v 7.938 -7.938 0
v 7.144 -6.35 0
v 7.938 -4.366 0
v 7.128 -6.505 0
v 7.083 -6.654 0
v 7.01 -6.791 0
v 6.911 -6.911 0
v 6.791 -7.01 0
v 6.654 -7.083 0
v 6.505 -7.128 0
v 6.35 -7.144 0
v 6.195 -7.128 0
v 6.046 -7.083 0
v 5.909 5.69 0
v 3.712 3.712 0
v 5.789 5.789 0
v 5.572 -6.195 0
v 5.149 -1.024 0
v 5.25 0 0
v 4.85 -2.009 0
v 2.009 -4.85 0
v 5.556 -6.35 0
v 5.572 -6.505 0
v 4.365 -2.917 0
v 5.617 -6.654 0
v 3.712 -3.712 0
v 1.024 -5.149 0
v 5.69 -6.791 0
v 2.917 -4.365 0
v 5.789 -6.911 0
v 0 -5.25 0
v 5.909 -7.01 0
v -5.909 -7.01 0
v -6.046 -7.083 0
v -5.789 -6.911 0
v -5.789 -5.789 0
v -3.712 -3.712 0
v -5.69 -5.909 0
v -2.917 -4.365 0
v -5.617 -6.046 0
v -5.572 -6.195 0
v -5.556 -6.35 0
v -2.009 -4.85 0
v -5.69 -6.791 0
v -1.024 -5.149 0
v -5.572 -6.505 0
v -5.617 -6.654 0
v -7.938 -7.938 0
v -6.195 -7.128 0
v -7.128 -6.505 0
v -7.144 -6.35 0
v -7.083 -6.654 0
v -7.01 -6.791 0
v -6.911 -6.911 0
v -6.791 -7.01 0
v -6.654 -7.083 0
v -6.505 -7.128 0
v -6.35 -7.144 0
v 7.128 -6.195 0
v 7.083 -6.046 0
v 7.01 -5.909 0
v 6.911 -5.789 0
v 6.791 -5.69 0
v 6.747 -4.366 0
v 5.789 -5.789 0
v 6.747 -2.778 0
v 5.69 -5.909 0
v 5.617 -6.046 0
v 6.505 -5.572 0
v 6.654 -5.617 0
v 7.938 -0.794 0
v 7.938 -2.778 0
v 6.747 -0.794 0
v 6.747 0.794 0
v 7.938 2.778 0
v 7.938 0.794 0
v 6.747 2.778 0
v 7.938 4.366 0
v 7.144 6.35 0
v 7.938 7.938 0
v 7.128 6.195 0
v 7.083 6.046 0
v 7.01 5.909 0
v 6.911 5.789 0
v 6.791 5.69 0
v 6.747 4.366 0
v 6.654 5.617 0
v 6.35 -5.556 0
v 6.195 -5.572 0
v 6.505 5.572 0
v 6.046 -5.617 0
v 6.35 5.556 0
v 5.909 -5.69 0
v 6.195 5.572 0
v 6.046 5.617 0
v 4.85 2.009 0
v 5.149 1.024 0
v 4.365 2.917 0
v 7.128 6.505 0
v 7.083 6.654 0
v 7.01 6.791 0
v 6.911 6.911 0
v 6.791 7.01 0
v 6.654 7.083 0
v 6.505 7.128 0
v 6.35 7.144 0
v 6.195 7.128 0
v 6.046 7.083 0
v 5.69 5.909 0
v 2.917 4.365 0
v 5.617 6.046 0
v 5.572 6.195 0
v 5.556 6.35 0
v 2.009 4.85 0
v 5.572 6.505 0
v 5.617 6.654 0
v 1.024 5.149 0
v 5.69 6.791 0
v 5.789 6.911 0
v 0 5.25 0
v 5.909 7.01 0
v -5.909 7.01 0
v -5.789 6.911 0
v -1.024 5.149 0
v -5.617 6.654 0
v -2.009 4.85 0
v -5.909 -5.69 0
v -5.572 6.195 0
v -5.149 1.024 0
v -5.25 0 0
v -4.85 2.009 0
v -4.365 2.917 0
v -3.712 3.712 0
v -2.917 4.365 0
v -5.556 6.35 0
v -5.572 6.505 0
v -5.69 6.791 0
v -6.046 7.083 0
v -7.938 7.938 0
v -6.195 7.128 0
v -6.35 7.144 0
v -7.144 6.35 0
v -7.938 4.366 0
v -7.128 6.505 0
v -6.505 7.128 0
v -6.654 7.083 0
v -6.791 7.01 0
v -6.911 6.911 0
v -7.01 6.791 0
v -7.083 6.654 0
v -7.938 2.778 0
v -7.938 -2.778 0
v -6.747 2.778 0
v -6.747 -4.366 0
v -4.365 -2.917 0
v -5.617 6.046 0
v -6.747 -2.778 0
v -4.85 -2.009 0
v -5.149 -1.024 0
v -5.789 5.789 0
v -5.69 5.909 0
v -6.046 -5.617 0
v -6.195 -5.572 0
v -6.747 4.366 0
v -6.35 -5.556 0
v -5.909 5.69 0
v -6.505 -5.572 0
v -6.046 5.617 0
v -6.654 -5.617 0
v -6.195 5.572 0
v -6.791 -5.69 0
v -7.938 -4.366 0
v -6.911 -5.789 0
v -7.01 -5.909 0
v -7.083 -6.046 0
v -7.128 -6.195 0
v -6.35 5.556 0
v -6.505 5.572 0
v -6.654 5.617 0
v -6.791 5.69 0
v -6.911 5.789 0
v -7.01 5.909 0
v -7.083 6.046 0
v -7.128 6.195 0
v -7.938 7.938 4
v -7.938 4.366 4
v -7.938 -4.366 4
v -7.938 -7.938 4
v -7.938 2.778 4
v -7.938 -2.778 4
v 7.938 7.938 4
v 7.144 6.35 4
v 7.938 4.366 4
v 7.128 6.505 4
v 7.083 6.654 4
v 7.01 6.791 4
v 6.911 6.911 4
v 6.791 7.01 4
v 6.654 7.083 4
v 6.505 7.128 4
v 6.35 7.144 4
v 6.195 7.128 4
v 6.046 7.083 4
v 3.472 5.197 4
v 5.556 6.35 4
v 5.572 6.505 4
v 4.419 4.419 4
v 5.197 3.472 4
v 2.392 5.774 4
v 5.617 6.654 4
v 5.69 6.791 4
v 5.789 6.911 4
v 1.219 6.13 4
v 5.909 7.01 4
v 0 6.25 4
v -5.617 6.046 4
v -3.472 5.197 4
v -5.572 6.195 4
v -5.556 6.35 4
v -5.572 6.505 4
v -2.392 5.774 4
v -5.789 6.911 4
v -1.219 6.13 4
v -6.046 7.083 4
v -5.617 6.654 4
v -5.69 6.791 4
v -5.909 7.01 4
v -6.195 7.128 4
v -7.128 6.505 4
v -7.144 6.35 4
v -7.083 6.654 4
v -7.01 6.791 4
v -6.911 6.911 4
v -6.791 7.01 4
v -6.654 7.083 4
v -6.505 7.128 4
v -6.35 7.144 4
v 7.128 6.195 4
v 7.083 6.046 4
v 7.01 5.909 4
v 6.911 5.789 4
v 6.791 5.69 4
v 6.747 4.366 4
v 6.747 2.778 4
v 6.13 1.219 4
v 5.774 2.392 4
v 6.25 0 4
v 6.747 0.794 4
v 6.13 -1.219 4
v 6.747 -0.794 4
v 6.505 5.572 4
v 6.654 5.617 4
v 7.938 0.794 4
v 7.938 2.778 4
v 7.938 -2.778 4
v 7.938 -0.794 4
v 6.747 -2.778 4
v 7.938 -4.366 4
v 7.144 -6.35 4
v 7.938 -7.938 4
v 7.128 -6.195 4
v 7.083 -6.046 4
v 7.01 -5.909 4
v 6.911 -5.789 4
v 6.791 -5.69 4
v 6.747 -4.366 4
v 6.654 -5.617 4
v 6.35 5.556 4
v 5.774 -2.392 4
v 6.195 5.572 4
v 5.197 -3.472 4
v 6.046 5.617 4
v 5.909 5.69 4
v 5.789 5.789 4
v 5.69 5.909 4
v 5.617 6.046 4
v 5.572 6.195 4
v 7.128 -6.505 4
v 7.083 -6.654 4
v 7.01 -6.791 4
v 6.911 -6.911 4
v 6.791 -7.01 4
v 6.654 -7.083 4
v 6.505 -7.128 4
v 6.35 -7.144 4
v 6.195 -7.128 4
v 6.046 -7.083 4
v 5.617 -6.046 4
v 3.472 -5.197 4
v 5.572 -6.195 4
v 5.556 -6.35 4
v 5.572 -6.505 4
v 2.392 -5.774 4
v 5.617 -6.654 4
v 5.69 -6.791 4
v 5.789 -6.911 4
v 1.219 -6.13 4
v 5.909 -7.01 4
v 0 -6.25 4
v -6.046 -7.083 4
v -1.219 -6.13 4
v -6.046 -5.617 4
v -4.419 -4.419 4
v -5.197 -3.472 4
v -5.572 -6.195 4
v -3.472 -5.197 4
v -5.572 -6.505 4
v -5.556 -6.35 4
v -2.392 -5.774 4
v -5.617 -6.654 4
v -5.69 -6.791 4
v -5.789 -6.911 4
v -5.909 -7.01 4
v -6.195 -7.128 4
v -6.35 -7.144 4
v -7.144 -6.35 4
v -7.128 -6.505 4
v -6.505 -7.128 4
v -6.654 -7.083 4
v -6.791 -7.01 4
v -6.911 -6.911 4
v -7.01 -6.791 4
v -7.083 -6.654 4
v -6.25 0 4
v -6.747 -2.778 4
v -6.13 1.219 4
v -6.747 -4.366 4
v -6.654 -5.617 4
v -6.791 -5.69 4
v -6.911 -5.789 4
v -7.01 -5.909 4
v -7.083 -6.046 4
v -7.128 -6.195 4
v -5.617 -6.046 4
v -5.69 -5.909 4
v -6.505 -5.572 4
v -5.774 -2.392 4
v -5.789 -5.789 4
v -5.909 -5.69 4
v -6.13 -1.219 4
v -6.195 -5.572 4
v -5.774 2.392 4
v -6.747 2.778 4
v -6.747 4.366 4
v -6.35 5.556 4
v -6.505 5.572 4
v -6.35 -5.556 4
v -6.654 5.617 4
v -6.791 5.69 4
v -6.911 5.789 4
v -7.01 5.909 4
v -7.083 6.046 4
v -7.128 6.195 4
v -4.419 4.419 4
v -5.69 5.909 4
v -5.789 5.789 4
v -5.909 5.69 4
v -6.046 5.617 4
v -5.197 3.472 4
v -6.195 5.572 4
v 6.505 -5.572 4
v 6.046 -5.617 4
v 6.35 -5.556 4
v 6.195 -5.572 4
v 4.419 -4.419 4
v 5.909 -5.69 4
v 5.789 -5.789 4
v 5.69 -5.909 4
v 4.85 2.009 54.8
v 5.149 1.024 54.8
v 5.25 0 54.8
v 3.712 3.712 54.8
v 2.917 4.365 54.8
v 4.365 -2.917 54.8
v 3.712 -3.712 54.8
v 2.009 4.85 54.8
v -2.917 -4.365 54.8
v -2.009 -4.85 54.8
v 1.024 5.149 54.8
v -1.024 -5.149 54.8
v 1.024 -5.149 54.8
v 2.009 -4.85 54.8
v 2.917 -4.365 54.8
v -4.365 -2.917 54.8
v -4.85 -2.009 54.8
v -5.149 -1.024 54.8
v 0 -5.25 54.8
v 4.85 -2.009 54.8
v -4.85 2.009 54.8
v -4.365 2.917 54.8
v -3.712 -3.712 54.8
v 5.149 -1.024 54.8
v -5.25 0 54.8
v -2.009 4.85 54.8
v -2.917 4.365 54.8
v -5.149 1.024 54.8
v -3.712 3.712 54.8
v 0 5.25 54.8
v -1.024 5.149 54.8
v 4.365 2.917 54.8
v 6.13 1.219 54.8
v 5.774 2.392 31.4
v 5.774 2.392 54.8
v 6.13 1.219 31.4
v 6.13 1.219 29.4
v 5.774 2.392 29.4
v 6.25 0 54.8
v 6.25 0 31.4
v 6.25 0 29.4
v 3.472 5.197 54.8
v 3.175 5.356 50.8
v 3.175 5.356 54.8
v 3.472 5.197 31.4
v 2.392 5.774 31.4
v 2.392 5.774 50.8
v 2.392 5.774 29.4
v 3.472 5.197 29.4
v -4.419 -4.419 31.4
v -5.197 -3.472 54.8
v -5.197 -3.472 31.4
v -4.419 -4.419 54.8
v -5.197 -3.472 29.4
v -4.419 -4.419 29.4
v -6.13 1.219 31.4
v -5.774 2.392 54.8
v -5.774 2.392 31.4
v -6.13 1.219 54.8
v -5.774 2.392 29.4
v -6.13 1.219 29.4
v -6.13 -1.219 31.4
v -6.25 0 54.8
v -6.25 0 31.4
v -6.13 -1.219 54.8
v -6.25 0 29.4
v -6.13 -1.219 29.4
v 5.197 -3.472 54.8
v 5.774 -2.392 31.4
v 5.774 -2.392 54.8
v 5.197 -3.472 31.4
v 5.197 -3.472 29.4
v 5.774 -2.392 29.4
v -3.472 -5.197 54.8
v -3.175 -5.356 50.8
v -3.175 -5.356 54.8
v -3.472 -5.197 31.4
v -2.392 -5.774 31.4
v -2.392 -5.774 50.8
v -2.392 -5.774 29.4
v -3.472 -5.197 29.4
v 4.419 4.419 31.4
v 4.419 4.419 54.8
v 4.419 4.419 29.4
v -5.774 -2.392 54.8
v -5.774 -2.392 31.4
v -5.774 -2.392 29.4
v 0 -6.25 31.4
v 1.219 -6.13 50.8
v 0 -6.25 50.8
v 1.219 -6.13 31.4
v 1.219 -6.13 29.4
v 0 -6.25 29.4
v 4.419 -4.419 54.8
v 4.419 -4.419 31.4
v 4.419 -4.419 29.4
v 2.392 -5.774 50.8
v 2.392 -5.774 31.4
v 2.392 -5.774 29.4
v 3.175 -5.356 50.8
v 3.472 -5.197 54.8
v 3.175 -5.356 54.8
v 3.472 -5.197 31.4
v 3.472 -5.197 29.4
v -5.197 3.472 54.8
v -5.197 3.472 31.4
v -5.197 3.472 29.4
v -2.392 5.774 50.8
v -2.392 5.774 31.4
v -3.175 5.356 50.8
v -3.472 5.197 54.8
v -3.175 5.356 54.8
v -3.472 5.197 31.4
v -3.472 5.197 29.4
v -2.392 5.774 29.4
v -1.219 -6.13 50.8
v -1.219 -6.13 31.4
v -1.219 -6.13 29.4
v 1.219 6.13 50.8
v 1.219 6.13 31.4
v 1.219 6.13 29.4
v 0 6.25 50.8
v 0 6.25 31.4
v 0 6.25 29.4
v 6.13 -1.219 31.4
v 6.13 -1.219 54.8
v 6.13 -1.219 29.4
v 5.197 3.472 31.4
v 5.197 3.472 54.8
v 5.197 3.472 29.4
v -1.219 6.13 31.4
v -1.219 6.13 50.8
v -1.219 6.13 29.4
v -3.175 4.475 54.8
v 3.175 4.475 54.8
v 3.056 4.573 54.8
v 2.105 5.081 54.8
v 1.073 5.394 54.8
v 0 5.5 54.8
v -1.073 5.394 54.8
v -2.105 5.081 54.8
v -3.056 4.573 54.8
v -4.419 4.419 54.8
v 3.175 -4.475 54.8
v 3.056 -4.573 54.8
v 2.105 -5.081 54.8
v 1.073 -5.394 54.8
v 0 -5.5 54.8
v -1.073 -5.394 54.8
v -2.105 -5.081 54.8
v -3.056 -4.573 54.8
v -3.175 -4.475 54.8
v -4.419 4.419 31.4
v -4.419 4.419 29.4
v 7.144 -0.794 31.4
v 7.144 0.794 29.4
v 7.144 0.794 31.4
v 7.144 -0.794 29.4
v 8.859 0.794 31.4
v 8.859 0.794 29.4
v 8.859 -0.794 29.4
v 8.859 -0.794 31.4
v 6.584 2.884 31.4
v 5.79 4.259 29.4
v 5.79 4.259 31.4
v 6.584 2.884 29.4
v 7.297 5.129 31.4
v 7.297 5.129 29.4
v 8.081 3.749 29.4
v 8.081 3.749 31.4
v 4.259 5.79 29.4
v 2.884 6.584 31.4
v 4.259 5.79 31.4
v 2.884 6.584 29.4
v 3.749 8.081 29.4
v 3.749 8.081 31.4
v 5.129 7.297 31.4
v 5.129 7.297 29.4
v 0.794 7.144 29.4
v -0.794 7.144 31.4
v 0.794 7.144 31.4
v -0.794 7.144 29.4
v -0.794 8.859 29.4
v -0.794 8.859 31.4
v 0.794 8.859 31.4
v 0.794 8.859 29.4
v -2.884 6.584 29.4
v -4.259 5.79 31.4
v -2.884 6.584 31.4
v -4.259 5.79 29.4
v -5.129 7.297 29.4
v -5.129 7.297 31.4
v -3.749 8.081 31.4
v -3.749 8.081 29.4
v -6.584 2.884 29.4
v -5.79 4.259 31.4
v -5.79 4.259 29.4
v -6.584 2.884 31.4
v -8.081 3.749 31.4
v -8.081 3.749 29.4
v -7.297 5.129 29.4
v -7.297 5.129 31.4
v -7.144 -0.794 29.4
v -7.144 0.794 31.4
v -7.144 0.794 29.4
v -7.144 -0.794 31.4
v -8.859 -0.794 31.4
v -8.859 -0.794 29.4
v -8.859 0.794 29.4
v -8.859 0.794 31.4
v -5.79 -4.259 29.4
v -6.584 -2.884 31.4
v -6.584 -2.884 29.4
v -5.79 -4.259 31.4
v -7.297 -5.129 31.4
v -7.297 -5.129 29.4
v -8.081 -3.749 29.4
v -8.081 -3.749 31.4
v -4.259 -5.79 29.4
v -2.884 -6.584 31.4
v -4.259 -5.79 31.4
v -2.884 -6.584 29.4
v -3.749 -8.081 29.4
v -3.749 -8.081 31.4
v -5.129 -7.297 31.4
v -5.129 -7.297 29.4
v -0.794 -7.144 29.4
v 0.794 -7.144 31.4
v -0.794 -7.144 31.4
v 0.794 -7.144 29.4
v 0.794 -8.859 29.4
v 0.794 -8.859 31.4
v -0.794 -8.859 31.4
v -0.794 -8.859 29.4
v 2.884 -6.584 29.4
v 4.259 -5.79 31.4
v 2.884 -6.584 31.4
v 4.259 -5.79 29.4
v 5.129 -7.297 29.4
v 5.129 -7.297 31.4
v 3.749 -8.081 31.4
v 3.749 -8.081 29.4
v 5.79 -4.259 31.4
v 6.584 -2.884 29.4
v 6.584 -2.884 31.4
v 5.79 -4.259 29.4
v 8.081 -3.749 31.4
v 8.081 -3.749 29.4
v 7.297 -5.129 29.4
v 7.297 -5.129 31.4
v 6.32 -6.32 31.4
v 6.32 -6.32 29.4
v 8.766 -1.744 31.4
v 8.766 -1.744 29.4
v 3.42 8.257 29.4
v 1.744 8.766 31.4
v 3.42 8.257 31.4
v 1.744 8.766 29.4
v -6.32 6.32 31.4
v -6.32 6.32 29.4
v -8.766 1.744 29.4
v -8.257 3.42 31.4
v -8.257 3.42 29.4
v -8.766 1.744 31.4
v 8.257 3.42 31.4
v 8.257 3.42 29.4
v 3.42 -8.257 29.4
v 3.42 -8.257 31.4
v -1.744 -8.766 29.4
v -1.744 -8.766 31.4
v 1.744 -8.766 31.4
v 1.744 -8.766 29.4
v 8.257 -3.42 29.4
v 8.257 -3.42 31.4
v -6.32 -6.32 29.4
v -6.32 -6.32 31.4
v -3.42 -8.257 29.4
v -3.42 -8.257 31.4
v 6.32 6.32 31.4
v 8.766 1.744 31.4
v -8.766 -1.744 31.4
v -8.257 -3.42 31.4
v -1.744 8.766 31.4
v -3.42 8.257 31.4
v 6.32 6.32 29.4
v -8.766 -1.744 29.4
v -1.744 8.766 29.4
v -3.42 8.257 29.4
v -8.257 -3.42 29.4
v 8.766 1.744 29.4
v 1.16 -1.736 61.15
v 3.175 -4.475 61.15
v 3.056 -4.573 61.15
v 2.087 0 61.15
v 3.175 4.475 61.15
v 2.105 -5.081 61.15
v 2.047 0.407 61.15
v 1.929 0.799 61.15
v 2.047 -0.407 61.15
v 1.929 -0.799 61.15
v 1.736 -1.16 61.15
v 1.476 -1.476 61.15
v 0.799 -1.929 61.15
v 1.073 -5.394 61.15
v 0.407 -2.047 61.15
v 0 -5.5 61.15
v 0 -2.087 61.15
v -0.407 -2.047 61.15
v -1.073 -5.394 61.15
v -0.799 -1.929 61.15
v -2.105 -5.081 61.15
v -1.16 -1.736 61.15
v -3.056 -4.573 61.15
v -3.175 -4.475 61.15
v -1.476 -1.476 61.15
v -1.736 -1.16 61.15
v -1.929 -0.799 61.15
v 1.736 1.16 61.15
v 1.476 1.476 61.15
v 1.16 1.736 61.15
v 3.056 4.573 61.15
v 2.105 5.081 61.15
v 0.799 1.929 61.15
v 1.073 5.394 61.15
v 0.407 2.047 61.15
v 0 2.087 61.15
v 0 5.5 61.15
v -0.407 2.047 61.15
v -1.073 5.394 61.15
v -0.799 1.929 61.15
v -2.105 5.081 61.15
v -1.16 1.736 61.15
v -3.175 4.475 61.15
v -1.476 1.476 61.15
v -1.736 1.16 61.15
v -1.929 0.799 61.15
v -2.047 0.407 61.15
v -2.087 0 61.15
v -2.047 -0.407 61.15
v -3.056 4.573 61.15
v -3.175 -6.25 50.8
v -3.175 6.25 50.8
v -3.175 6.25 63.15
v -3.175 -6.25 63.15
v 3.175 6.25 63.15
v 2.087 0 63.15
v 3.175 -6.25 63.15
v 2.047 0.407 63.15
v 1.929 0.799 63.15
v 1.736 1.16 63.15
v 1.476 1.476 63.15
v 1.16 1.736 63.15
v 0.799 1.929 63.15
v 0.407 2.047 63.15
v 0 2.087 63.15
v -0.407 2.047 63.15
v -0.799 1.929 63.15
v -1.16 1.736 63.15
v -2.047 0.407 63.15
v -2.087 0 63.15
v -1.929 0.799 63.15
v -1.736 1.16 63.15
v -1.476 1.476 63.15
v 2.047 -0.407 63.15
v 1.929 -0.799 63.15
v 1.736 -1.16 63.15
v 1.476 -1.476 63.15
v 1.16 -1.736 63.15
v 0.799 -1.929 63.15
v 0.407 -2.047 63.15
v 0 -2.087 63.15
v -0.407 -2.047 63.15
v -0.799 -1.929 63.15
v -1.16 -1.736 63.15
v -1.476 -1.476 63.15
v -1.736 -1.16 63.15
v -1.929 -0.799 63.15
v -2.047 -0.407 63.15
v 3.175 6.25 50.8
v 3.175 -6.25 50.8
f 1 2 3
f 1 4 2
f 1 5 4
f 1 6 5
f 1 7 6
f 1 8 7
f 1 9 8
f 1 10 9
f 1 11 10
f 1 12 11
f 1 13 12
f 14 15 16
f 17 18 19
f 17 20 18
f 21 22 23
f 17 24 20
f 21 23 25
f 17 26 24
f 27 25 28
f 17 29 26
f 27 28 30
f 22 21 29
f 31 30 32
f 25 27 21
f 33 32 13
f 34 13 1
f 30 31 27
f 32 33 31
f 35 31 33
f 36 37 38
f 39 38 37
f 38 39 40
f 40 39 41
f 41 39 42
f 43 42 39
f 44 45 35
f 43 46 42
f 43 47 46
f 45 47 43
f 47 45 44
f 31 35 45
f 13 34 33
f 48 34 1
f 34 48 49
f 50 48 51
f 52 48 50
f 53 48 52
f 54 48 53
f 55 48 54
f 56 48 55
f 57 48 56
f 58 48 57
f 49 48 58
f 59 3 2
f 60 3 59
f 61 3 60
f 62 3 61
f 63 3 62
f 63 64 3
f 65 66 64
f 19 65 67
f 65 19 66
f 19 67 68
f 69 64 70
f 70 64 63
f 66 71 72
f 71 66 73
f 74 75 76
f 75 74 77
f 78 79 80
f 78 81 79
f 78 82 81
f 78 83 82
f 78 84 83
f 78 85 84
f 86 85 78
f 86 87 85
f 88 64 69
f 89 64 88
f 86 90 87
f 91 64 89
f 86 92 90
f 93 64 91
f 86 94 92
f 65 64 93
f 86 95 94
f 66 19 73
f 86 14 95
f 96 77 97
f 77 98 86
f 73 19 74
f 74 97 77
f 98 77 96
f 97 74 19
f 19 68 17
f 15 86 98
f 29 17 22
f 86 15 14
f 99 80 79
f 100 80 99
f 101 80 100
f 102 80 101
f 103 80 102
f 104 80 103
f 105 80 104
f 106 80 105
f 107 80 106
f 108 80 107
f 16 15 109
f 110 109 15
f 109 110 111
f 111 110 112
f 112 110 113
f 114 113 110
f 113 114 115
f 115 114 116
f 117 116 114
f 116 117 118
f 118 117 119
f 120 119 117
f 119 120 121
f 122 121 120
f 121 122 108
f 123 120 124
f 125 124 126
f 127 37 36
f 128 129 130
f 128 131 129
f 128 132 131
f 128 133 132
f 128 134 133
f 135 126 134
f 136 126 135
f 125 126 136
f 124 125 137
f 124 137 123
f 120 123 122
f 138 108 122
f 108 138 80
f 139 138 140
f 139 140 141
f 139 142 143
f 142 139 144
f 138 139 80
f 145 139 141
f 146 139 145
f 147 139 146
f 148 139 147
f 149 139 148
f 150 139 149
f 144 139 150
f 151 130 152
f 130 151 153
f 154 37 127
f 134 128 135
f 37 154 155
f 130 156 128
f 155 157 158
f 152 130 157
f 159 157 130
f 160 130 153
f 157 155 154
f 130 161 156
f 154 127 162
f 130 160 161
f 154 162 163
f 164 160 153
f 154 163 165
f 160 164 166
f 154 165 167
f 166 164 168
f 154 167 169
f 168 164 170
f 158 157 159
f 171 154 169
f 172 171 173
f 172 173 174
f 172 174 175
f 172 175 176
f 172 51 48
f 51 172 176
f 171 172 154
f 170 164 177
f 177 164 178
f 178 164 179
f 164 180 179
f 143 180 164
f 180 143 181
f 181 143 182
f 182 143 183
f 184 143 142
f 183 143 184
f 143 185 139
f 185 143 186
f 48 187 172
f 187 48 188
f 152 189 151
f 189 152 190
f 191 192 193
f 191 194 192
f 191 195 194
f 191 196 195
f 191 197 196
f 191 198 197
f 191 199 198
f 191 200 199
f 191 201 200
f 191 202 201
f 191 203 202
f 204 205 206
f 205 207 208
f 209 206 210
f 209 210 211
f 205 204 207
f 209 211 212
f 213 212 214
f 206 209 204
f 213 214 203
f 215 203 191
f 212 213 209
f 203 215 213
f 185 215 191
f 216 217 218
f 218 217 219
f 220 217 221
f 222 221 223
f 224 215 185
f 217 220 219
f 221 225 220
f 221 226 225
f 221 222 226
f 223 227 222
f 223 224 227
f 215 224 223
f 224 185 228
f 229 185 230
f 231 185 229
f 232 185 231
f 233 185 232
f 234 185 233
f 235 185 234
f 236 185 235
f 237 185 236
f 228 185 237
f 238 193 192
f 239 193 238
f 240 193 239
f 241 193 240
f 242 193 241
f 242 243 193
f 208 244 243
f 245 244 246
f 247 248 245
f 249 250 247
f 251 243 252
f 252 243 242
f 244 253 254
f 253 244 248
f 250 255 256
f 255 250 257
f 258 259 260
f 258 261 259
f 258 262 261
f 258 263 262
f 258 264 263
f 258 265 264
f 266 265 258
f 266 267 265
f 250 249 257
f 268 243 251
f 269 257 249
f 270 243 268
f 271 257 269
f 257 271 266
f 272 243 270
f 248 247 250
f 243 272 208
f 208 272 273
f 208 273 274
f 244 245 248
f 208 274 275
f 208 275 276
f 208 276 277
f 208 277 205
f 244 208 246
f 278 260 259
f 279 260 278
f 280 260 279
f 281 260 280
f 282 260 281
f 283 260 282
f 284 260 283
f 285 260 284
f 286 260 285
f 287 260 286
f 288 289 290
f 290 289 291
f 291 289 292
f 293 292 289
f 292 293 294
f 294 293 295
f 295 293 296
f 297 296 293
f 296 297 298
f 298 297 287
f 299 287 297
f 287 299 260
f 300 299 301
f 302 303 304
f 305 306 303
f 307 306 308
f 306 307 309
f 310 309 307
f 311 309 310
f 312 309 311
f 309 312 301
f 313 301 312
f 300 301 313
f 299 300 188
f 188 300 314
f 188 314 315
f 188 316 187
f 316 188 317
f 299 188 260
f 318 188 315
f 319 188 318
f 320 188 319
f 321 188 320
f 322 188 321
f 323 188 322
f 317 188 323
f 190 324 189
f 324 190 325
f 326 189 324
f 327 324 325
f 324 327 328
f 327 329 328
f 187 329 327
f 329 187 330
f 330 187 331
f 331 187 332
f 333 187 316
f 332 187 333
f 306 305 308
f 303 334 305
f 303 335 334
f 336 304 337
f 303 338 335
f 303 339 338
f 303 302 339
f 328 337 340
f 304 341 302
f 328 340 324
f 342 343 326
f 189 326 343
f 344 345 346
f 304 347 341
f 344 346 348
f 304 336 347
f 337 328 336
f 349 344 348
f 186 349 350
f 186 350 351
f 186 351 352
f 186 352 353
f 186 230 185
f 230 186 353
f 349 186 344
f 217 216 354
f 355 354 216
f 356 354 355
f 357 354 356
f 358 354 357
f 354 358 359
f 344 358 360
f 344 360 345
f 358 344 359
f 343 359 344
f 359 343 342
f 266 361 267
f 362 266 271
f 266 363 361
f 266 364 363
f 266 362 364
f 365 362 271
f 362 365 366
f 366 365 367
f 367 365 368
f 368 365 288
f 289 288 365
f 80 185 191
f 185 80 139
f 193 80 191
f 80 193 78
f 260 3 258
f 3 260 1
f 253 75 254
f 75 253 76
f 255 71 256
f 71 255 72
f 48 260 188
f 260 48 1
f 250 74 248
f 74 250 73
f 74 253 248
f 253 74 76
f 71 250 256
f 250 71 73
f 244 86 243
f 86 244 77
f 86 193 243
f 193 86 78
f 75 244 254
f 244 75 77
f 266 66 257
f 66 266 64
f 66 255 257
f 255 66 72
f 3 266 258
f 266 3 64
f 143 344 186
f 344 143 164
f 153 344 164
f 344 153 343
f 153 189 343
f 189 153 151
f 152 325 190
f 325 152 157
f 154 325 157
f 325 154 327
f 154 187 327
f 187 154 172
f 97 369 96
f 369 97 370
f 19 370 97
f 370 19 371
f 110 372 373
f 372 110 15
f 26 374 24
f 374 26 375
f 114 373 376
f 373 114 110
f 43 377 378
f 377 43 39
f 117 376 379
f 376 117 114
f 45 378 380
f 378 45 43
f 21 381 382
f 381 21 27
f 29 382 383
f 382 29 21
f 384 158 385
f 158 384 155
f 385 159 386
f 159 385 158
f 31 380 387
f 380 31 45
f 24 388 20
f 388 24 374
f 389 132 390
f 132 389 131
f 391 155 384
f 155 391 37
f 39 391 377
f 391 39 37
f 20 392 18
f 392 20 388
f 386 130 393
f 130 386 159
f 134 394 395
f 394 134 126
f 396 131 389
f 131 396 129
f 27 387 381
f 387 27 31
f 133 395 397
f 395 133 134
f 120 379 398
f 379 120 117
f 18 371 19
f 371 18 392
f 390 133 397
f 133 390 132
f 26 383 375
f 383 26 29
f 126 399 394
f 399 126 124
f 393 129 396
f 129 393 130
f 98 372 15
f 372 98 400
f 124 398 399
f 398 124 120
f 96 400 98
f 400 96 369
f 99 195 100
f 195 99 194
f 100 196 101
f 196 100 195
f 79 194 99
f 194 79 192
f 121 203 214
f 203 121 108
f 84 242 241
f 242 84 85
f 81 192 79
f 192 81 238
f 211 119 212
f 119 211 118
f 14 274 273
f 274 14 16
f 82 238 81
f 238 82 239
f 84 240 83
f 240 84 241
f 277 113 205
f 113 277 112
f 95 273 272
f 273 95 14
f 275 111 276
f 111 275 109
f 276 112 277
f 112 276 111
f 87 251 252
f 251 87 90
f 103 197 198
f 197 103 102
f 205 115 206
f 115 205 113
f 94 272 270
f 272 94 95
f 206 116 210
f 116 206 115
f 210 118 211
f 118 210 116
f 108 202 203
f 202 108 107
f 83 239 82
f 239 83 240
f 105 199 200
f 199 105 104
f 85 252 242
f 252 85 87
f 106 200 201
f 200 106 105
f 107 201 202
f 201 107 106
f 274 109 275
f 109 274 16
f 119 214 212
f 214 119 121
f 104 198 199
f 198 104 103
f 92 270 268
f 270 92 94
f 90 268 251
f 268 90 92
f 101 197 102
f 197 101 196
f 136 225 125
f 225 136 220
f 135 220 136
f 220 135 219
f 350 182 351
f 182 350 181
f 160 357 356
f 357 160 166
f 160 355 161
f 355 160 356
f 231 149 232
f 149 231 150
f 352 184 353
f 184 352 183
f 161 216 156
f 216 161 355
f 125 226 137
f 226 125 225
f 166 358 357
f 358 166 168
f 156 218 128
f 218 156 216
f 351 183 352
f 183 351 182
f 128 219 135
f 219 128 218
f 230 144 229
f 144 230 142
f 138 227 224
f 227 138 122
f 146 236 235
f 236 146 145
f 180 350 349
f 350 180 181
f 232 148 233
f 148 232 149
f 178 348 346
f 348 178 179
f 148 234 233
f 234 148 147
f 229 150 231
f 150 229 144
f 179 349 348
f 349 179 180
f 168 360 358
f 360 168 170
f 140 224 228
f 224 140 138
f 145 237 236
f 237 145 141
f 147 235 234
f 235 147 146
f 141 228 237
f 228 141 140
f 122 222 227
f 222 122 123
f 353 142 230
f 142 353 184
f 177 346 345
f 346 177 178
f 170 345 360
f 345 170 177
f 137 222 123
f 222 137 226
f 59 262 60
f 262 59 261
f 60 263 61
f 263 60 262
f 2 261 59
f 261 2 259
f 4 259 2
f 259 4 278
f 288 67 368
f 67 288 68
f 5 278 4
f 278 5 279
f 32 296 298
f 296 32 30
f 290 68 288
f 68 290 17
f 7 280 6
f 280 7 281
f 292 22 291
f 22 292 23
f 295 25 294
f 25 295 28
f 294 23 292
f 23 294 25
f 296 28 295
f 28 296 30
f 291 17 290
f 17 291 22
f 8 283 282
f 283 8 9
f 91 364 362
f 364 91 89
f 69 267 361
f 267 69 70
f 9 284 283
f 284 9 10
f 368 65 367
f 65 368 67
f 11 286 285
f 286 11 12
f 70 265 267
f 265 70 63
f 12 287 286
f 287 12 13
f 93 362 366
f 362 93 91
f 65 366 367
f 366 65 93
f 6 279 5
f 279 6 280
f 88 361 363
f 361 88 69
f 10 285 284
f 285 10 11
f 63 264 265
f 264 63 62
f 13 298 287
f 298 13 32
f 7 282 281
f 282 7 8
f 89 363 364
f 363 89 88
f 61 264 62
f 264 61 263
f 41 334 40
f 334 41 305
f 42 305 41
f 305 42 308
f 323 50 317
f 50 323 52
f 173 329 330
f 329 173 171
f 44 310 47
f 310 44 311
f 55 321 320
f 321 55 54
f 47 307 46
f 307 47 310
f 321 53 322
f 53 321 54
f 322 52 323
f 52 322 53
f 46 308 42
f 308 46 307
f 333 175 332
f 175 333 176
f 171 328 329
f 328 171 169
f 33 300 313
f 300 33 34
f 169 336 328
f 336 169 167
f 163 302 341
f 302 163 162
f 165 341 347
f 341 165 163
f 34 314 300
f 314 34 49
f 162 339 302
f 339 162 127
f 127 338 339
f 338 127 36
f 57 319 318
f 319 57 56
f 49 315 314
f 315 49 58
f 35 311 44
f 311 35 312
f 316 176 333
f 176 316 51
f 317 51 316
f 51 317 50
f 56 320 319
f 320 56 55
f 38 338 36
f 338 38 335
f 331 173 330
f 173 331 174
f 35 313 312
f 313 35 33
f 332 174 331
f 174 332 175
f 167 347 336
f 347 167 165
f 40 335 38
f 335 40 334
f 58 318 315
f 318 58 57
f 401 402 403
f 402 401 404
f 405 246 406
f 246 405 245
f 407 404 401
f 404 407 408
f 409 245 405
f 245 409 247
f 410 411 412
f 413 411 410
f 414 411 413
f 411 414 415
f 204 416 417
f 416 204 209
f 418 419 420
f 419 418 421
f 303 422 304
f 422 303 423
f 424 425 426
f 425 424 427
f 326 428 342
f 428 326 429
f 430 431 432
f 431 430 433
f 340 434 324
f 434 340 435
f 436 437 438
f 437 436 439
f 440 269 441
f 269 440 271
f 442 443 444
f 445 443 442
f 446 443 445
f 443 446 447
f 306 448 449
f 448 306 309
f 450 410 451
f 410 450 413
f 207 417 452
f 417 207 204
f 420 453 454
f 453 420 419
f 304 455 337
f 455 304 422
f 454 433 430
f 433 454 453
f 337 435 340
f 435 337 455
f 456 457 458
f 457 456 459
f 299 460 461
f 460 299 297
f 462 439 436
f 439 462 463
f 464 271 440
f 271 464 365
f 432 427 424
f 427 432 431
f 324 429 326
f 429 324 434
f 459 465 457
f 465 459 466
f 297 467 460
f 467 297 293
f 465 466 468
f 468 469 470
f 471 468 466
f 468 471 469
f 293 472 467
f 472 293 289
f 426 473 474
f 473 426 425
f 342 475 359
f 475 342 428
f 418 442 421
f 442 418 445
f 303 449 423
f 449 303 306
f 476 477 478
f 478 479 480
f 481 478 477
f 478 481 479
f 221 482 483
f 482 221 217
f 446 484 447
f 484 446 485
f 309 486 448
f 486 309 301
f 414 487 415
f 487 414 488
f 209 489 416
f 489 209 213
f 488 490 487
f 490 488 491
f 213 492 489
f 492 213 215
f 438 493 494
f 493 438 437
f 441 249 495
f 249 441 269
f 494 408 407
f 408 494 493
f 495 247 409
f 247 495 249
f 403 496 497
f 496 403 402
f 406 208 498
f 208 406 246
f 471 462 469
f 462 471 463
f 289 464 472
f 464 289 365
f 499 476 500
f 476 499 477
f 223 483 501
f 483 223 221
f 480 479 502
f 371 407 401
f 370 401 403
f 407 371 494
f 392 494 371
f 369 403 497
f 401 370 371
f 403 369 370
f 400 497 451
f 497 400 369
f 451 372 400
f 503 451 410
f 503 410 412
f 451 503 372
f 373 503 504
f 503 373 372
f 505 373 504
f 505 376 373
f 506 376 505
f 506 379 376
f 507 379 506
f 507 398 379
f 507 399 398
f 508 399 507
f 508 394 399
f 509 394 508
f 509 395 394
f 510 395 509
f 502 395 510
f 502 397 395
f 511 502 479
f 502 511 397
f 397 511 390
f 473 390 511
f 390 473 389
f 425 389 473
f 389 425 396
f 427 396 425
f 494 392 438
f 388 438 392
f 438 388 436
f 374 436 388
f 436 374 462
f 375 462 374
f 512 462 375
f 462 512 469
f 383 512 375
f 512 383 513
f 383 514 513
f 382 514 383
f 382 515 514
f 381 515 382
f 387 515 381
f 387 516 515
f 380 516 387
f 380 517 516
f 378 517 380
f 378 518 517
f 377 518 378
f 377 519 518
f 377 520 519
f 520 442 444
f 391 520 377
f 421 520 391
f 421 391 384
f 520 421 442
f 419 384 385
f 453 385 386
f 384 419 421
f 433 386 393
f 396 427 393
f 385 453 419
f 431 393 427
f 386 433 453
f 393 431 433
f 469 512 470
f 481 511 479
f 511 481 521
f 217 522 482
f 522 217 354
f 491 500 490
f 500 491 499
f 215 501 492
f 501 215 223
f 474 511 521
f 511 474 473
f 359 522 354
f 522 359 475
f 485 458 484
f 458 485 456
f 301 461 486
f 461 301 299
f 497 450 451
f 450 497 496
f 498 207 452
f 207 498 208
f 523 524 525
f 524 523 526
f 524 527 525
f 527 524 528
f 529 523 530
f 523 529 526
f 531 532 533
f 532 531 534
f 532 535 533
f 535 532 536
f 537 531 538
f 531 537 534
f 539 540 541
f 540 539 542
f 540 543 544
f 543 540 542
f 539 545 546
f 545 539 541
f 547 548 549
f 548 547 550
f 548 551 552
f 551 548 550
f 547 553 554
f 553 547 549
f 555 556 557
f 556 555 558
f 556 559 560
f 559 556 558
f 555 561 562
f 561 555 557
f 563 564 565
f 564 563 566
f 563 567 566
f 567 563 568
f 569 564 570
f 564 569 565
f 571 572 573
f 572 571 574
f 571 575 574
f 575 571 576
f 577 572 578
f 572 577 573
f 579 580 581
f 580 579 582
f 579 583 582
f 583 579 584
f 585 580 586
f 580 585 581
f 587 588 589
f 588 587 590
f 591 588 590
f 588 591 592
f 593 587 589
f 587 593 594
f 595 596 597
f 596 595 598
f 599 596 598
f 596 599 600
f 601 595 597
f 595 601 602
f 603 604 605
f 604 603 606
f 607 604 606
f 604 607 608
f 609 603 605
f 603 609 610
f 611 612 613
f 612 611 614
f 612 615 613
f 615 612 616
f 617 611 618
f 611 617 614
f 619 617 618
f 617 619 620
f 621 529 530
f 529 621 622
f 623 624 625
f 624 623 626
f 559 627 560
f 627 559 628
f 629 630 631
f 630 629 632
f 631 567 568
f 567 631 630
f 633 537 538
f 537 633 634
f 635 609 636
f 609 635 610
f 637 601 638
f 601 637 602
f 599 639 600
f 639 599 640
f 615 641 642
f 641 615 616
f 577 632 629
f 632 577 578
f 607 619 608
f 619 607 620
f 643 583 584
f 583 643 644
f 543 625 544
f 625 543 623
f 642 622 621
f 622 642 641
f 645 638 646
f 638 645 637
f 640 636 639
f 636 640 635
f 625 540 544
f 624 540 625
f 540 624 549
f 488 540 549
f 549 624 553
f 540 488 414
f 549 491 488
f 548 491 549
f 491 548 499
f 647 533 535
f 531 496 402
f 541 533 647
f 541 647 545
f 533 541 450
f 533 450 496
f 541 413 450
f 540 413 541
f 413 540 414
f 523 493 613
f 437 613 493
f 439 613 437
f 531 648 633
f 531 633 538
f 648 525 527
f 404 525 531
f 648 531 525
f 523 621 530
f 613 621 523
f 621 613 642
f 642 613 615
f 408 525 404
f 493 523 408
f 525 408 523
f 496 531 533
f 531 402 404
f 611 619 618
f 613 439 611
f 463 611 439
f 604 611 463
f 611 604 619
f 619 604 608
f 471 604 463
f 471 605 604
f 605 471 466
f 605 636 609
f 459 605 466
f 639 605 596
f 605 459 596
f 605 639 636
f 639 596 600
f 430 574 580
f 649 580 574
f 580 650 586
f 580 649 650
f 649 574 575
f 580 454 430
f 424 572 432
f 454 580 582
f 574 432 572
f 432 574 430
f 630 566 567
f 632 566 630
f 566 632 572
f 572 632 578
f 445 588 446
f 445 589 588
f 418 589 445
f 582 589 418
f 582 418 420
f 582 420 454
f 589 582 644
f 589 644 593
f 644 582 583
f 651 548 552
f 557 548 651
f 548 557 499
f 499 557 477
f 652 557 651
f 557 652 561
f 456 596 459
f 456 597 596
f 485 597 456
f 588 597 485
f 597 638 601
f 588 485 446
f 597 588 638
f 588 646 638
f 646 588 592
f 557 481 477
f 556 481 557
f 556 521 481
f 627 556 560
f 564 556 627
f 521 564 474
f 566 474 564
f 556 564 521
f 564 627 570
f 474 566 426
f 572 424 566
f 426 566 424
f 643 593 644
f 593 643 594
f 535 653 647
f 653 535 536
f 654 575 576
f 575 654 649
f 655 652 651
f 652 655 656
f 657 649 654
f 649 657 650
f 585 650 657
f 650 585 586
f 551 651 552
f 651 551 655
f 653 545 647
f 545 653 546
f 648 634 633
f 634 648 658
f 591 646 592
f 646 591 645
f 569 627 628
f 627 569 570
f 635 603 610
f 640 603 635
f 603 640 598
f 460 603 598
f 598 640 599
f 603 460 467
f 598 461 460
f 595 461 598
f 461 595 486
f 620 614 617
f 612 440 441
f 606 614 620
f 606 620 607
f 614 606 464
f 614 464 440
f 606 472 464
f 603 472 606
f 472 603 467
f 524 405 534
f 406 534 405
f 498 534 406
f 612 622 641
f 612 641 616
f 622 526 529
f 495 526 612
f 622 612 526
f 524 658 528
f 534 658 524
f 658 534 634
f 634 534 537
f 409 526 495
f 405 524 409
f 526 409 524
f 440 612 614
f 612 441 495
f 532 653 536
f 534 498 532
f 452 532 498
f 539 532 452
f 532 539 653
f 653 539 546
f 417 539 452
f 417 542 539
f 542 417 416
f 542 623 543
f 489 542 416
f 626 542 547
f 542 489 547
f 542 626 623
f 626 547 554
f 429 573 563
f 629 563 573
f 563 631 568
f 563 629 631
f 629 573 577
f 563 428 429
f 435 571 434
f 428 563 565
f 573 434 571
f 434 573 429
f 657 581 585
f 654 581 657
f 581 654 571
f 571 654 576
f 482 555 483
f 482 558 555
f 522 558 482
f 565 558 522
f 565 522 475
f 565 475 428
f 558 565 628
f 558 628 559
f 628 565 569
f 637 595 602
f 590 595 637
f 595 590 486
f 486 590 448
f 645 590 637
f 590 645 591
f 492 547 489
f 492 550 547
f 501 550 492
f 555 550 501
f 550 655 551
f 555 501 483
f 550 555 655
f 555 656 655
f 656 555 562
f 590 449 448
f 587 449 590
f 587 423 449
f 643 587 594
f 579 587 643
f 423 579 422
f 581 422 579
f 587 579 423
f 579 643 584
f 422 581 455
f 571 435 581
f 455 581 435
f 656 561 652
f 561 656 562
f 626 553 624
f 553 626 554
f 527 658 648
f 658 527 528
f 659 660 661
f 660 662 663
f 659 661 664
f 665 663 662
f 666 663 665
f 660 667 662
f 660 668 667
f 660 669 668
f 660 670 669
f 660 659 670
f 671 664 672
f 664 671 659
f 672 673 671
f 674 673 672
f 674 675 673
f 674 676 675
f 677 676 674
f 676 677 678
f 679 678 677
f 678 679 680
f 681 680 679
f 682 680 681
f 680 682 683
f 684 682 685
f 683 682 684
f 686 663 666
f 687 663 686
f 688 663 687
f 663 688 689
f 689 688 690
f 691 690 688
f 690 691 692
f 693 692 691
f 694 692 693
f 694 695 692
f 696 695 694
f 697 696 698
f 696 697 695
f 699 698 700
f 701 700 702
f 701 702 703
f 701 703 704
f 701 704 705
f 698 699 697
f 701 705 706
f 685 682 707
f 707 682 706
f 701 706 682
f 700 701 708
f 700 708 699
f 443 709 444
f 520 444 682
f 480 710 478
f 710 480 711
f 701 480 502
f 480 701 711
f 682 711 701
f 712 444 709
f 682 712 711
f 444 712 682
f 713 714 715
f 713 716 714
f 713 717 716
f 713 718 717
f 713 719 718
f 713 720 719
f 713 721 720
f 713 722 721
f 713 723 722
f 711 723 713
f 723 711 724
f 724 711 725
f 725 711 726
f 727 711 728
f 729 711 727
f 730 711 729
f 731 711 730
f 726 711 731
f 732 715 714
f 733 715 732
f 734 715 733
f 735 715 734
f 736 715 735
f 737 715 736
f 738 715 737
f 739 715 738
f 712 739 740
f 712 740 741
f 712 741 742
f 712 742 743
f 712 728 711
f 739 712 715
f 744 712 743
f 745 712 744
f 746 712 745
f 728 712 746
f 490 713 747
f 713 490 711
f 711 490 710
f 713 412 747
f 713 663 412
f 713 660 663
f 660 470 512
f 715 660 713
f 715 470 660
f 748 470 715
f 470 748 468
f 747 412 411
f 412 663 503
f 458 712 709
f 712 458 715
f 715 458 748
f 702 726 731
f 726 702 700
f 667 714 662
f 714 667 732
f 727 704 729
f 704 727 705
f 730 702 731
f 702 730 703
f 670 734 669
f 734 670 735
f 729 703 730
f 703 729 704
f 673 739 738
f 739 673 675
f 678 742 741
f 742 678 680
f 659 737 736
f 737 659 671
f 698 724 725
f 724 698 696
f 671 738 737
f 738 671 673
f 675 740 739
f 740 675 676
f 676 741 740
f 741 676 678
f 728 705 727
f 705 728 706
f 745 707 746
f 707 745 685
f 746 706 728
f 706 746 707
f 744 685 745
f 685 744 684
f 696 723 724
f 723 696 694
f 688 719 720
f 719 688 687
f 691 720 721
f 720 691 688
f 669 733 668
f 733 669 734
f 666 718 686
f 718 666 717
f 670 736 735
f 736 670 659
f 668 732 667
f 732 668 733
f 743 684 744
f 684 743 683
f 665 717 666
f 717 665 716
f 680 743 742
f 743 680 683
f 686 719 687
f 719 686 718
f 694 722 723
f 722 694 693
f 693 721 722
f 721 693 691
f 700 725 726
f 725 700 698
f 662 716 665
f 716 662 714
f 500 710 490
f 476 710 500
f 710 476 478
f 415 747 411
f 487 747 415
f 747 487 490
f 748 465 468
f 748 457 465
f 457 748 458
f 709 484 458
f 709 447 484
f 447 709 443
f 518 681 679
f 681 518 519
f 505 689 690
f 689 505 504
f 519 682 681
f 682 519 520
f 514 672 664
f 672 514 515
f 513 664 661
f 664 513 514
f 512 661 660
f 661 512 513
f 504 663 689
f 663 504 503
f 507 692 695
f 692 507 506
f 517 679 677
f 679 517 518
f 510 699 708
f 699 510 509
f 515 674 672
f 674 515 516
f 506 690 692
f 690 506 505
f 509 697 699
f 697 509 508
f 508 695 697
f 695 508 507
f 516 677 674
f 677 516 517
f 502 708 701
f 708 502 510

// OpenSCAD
// coil form
//

$sd = 10.5; // 10mm slug diameter plus clearance
$sl = 25.4; // 25.4mm (1 inch) slug length
$th = 2;    // 2mm wall thickness
$bh = 4;    // 4mm base height

$nn = 25.4 / 16; // 1/16 inch notches
$bw = 25.4 / 2 + $nn;  // 1/2 inch square base for mount holes (add twice notch size for actual base size)
$dr = $nn; // 1/16 drill radius for mount hole


// yoke/canopy dimensions
$xd = 25.4 / 8 + 1; // diameter for adjust screw hole
$xc = 25.4 / 4; // clearance above tube for adjust thingy
$xw = 25.4 / 4; // width of adjust thingy
$xh = 2;        // thickness of adjust thingy


$fn=32; // num frames in shape (global)

color("red") // base
  difference()
  {
    linear_extrude(height=$bh) // square base
      square($bw+$nn,center=true);
    
    translate([$bw/2 + $nn/4, 0, -1]) // notches
      linear_extrude(height=$bh + 2)
        square($nn, center=true);

    translate([$bw/2 + $nn/4, $bw/4, -1])
      linear_extrude(height=$bh + 2)
        square($nn, center=true);

    translate([$bw/2 + $nn/4, -$bw/4, -1])
      linear_extrude(height=$bh + 2)
        square($nn, center=true);

    translate([-$bw/2 - $nn/4, $bw/4, -1])
      linear_extrude(height=$bh + 2)
        square($nn, center=true);

    translate([-$bw/2 - $nn/4, -$bw/4, -1])
      linear_extrude(height=$bh + 2)
        square($nn, center=true);

    translate([0,0,-1])
      linear_extrude(height=$bh + 2)
        circle(d=$sd);

    translate([$bw/2-$nn/2,$bw/2-$nn/2,-1])
      linear_extrude(height=$bh + 2)
        circle(d=$dr);
    translate([-($bw/2-$nn/2),$bw/2-$nn/2,-1])
      linear_extrude(height=$bh + 2)
        circle(d=$dr);
    translate([$bw/2-$nn/2,-($bw/2-$nn/2),-1])
      linear_extrude(height=$bh + 2)
        circle(d=$dr);
    translate([-($bw/2-$nn/2),-($bw/2-$nn/2),-1])
      linear_extrude(height=$bh + 2)
        circle(d=$dr);
  }

color("orange")
  translate([0,0,$bh-1])
    difference()
    {
      linear_extrude(height=2*$sl+1)
        circle(d=$sd+$th);

      translate([0,0,-1])
        linear_extrude(height=2*$sl+3)
          circle(d=$sd);
    }

color("red")   // limit of slug motion
  translate([0,0,$sl+$bh])
    difference()
    {
      linear_extrude(height=$th)
        circle(d=$bw+$th+$nn);

      translate([0,0,-1])
        linear_extrude(height=$th+2)
          circle(d=$sd);

      for(ww=[0:30:359])
      {
        rotate([0,0,ww])
          translate([$bw/2 + $nn, 0, -1]) // notches
            linear_extrude(height=$bh + 2)
              square([2*$nn,$nn], center=true);
      }
        
    }

color("green")   // yoke/canopy thingy for adjustments
  translate([0,0,2*$sl+$bh])
    union()
    {
      translate([0,0,$xc])
        difference()
        {
          linear_extrude(height=$xh)
            square([$xw, $sd+$th], center=true);
          translate([0,0,-1])
            linear_extrude(height=$xh+2)
              circle(d=$xd);
        }

      translate([0,0,-$bh])
        difference()
        {
          union()
          {
            translate([0,$sd/2,0])
              linear_extrude(height=$bh+$xc+$xh)
                square([$xw,$th],center=true);
            translate([0,-$sd/2,0])
              linear_extrude(height=$bh+$xc+$xh)
                square([$xw,$th],center=true);
          }
          translate([0,0,-1])
            linear_extrude(height=$bh+$xc+$xh)
              circle(d=$sd+$th/4);
        }
    }
    
    
